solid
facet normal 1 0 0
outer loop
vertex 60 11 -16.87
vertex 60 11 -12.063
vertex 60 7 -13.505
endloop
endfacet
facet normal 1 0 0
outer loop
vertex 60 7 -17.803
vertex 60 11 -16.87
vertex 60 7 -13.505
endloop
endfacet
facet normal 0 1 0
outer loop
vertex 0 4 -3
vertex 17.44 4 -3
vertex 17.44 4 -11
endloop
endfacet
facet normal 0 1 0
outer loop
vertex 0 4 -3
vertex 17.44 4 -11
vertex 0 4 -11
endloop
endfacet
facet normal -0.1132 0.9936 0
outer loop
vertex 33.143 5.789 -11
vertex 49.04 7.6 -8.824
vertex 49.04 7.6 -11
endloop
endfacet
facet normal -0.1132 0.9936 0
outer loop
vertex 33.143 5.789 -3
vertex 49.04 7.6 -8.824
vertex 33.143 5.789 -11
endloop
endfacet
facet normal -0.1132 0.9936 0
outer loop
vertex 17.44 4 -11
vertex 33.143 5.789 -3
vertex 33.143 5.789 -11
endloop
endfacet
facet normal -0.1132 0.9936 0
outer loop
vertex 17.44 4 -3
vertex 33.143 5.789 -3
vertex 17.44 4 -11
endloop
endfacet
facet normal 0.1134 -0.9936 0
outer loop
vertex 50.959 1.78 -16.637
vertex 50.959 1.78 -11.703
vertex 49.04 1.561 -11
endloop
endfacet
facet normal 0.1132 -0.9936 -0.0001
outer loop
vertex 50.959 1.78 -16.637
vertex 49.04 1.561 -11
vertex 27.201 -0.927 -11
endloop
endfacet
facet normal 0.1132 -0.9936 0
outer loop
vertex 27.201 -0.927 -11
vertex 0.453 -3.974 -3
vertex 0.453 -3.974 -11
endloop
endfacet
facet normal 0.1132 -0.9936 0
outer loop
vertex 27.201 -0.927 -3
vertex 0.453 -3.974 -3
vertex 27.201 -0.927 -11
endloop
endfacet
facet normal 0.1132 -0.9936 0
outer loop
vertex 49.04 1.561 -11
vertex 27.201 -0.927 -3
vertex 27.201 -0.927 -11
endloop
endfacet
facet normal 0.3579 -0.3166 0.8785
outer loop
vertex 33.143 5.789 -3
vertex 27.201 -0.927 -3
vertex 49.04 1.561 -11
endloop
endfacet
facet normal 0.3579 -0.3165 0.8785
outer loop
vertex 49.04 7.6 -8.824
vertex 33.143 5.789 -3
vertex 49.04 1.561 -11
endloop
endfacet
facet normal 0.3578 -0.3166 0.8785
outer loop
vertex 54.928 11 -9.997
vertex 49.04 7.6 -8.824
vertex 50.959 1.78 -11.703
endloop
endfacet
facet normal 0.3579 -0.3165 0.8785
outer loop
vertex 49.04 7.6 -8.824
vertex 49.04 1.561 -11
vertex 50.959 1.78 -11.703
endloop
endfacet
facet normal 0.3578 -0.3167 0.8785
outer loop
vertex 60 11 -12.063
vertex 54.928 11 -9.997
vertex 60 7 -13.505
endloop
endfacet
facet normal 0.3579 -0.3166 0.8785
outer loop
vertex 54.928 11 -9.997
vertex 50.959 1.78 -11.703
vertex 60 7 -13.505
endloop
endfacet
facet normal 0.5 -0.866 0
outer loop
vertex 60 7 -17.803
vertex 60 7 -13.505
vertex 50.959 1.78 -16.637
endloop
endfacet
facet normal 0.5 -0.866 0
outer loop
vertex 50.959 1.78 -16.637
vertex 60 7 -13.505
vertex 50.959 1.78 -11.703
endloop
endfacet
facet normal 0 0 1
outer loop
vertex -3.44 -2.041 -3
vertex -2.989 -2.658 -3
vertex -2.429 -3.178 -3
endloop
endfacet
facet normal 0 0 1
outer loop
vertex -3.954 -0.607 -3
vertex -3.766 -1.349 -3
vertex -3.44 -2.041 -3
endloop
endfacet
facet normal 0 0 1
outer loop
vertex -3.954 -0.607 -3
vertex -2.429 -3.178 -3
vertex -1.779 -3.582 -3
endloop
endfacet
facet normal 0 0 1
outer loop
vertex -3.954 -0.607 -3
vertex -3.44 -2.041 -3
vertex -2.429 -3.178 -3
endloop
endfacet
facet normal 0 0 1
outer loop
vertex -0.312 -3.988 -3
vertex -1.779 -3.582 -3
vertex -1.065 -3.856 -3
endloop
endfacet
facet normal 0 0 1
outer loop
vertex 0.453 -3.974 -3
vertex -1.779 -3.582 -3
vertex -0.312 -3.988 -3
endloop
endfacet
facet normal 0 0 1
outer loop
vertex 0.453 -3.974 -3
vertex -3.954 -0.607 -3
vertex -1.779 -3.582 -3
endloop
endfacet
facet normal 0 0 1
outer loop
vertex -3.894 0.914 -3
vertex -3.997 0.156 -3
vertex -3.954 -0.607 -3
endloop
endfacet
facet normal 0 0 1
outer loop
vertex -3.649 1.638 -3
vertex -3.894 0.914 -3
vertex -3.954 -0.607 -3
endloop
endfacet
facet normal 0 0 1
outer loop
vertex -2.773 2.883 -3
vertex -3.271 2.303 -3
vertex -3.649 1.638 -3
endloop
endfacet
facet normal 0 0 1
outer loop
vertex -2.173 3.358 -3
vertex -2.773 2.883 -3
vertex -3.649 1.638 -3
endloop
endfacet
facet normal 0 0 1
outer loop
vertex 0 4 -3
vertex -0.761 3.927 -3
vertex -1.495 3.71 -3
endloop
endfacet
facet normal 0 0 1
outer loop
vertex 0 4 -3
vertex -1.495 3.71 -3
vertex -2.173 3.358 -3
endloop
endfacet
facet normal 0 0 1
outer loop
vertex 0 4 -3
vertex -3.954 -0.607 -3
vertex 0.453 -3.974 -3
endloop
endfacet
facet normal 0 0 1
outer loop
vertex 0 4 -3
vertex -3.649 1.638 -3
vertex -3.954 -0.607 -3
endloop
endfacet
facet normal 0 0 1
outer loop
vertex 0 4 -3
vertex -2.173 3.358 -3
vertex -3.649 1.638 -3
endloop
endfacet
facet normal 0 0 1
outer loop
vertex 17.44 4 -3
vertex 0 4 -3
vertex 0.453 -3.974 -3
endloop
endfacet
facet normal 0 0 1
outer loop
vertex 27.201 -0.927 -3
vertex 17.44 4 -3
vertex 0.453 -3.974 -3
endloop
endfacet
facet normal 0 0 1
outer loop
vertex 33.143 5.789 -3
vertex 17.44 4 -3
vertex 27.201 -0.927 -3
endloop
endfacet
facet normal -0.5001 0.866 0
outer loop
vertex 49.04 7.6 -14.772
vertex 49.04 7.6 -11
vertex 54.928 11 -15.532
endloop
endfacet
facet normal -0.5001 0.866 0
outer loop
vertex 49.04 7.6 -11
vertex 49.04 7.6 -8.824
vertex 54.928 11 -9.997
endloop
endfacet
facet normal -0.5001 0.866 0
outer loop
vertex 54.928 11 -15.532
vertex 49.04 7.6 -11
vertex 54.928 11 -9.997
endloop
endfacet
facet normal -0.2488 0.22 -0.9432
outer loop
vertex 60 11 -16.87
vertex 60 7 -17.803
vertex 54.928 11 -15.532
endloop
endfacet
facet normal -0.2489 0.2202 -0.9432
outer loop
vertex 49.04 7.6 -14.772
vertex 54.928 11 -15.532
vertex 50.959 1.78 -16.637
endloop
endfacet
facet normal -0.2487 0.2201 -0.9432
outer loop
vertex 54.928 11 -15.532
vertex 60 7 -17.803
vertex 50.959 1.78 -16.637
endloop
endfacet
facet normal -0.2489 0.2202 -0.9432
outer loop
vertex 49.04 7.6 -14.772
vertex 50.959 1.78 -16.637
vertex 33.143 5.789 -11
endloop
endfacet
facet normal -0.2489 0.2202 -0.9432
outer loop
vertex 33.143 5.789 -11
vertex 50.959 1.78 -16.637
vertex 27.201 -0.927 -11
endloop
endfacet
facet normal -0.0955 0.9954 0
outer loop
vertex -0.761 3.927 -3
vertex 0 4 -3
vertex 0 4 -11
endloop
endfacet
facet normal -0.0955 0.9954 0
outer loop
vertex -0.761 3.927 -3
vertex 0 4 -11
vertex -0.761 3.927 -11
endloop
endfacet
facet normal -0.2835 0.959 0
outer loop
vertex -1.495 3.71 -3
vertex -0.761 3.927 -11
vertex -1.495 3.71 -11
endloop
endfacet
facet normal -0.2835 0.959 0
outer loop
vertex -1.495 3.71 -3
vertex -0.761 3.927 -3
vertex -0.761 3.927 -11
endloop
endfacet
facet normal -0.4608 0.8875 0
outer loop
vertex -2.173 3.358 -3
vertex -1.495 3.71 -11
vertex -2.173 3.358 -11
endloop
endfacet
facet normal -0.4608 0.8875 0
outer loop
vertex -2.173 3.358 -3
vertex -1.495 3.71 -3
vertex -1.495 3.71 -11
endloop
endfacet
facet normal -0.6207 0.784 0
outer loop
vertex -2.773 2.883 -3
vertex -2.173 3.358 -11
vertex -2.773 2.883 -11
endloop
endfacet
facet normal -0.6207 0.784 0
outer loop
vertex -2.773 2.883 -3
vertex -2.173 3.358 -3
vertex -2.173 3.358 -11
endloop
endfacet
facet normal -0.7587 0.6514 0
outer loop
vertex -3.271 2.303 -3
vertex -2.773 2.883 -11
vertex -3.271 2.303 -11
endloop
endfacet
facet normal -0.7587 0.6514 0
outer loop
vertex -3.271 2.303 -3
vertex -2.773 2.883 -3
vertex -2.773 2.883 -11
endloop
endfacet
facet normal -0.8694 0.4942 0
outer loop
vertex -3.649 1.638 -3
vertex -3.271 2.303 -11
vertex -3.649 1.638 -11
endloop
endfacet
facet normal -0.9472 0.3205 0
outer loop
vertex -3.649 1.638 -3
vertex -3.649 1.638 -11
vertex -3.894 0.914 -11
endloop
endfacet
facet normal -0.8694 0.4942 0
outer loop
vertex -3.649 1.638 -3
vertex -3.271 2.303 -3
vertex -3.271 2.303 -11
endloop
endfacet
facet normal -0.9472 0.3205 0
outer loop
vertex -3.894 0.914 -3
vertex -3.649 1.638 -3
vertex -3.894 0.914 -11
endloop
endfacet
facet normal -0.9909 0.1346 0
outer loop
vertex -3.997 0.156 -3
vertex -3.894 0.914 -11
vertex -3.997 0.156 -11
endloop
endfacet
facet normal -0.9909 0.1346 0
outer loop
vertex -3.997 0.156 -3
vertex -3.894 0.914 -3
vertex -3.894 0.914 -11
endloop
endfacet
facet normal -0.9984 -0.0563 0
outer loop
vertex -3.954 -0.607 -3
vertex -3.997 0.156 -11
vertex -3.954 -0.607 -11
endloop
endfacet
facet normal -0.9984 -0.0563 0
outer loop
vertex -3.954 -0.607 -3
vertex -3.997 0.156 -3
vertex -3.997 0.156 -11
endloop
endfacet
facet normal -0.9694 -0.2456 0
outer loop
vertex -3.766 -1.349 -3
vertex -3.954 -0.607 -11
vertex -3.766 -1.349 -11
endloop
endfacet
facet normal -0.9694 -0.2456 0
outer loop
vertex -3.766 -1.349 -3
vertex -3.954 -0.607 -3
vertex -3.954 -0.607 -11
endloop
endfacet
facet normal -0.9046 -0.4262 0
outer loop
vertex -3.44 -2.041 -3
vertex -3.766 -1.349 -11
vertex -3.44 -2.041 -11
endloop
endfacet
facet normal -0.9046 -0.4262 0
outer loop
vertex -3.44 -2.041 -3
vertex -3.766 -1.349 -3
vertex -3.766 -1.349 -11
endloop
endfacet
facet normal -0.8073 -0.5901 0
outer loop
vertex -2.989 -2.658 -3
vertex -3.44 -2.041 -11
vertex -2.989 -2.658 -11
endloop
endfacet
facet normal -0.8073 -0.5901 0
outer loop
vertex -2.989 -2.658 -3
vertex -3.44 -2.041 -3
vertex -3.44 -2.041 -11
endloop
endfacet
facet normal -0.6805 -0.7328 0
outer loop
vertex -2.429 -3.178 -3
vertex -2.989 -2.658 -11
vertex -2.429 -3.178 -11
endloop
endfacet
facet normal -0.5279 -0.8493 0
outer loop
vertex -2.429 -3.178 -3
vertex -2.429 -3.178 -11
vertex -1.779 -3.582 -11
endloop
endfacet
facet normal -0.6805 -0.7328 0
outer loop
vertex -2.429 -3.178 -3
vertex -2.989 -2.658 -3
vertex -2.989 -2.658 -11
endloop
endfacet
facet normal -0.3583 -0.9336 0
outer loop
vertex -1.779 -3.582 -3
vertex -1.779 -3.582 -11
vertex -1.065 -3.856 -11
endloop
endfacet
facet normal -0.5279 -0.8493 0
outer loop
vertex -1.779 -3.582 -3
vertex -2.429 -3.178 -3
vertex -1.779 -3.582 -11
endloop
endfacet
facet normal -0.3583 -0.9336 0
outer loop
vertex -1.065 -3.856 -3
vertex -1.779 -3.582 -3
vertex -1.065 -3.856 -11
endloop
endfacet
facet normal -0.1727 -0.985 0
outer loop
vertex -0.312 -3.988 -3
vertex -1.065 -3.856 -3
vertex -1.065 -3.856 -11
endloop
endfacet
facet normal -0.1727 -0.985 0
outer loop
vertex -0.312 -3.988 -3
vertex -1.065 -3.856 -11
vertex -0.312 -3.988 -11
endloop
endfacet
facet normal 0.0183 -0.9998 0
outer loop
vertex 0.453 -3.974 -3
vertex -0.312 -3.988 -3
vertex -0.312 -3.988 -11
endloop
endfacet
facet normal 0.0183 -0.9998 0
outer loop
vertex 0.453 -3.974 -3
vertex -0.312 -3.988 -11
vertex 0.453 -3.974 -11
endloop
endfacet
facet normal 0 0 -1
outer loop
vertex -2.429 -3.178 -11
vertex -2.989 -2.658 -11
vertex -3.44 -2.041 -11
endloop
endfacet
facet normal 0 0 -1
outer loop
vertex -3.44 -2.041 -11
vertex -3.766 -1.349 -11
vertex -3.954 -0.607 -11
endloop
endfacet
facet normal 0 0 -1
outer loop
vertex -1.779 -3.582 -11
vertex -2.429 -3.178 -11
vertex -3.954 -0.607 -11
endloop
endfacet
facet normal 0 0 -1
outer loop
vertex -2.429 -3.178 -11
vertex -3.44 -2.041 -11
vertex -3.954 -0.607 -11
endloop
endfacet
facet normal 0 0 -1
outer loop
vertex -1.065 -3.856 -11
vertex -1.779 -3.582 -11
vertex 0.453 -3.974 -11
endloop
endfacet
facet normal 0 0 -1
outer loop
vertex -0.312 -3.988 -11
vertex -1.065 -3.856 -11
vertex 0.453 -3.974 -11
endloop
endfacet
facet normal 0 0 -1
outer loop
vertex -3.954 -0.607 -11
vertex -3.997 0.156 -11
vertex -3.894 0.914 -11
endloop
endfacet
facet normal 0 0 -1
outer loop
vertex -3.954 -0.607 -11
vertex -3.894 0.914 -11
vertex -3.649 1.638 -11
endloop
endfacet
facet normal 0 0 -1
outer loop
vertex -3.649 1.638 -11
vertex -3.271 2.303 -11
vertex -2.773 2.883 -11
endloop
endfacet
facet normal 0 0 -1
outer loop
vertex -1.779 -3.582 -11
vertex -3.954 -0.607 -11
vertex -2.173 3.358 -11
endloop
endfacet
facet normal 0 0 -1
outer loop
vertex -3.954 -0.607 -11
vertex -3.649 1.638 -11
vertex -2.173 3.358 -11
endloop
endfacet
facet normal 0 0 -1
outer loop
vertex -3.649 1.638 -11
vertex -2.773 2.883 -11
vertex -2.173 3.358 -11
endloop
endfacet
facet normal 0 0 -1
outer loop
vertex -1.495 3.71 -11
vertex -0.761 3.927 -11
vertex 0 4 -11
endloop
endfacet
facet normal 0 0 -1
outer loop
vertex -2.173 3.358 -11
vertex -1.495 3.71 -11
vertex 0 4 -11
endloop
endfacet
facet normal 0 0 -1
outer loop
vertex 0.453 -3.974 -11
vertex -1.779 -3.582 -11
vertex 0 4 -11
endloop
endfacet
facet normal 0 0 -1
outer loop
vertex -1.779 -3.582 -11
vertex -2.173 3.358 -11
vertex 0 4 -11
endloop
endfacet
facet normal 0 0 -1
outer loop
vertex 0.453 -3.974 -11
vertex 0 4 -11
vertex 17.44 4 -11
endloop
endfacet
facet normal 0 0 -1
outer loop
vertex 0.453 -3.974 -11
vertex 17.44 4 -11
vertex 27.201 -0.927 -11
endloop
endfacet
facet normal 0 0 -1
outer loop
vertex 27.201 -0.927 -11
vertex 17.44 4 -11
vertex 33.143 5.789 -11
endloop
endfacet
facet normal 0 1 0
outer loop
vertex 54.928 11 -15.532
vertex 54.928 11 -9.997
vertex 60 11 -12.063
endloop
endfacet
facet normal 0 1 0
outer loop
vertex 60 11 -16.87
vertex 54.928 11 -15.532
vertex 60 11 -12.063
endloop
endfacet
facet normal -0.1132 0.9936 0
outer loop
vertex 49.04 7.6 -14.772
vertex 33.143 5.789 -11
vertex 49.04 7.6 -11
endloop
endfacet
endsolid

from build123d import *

# Parameters (mm, degrees)
EXTRUDE_START       = -3
EXTRUDE_1_DEPTH     = 8
EXTRUDE_2_DEPTH     = 8
CUT_EXTRUDE_1_DEPTH = 24.482669171


with BuildPart() as part:
    # 草图2 → 凸台-拉伸1 (new body)
    with BuildSketch(Plane.XY.offset(EXTRUDE_START)):
        with BuildLine():
            Line((0.452812855, -3.974287423), (50.958977377, 1.780163155))
            Line((50.958977377, 1.780163155), (60, 7))
            Line((60, 7), (60, 11))
            Line((60, 11), (54.92820323, 11))
            Line((54.92820323, 11), (49.039778636, 7.600316475))
            Line((49.039778636, 7.600316475), (17.440206483, 4))
            Line((17.440206483, 4), (0, 4))
            ThreePointArc((0, 4), (-3.993566682, -0.22677115), (0.452812855, -3.974287423))
        make_face()
    extrude(amount=-EXTRUDE_1_DEPTH)

    # 草图3 → 凸台-拉伸2 (add)
    with BuildSketch(Plane(origin=(0, 0, -11), x_dir=(-1, 0, 0), z_dir=(0, 0, -1))):
        Polygon((-27.201059955, -0.926709618), (-33.142680696, 5.789070951), (-49.039778636, 7.600316475), (-54.92820323, 11), (-60, 11), (-60, 7), (-50.958977377, 1.780163155), align=None)
    extrude(amount=EXTRUDE_2_DEPTH)

    # 草图4 → 切除-拉伸1 (cut, through all, along a direction that is not the sketch's normal)
    with BuildSketch(Plane(origin=(0.452812855, -3.974287423, 0), x_dir=(0.993571856, 0.113203214, 0), z_dir=(0.113203214, -0.993571856, 0))):
        Polygon((26.921301109, -11), (26.921301109, -19), (60.859546692, -19), align=None)
        Polygon((26.921301109, -3), (60.859546692, -15.352511196), (60.859546692, -3), align=None)
    extrude(amount=-CUT_EXTRUDE_1_DEPTH, dir=(-0.662620048, -0.748955721, 0), mode=Mode.SUBTRACT)


solid = part.part
